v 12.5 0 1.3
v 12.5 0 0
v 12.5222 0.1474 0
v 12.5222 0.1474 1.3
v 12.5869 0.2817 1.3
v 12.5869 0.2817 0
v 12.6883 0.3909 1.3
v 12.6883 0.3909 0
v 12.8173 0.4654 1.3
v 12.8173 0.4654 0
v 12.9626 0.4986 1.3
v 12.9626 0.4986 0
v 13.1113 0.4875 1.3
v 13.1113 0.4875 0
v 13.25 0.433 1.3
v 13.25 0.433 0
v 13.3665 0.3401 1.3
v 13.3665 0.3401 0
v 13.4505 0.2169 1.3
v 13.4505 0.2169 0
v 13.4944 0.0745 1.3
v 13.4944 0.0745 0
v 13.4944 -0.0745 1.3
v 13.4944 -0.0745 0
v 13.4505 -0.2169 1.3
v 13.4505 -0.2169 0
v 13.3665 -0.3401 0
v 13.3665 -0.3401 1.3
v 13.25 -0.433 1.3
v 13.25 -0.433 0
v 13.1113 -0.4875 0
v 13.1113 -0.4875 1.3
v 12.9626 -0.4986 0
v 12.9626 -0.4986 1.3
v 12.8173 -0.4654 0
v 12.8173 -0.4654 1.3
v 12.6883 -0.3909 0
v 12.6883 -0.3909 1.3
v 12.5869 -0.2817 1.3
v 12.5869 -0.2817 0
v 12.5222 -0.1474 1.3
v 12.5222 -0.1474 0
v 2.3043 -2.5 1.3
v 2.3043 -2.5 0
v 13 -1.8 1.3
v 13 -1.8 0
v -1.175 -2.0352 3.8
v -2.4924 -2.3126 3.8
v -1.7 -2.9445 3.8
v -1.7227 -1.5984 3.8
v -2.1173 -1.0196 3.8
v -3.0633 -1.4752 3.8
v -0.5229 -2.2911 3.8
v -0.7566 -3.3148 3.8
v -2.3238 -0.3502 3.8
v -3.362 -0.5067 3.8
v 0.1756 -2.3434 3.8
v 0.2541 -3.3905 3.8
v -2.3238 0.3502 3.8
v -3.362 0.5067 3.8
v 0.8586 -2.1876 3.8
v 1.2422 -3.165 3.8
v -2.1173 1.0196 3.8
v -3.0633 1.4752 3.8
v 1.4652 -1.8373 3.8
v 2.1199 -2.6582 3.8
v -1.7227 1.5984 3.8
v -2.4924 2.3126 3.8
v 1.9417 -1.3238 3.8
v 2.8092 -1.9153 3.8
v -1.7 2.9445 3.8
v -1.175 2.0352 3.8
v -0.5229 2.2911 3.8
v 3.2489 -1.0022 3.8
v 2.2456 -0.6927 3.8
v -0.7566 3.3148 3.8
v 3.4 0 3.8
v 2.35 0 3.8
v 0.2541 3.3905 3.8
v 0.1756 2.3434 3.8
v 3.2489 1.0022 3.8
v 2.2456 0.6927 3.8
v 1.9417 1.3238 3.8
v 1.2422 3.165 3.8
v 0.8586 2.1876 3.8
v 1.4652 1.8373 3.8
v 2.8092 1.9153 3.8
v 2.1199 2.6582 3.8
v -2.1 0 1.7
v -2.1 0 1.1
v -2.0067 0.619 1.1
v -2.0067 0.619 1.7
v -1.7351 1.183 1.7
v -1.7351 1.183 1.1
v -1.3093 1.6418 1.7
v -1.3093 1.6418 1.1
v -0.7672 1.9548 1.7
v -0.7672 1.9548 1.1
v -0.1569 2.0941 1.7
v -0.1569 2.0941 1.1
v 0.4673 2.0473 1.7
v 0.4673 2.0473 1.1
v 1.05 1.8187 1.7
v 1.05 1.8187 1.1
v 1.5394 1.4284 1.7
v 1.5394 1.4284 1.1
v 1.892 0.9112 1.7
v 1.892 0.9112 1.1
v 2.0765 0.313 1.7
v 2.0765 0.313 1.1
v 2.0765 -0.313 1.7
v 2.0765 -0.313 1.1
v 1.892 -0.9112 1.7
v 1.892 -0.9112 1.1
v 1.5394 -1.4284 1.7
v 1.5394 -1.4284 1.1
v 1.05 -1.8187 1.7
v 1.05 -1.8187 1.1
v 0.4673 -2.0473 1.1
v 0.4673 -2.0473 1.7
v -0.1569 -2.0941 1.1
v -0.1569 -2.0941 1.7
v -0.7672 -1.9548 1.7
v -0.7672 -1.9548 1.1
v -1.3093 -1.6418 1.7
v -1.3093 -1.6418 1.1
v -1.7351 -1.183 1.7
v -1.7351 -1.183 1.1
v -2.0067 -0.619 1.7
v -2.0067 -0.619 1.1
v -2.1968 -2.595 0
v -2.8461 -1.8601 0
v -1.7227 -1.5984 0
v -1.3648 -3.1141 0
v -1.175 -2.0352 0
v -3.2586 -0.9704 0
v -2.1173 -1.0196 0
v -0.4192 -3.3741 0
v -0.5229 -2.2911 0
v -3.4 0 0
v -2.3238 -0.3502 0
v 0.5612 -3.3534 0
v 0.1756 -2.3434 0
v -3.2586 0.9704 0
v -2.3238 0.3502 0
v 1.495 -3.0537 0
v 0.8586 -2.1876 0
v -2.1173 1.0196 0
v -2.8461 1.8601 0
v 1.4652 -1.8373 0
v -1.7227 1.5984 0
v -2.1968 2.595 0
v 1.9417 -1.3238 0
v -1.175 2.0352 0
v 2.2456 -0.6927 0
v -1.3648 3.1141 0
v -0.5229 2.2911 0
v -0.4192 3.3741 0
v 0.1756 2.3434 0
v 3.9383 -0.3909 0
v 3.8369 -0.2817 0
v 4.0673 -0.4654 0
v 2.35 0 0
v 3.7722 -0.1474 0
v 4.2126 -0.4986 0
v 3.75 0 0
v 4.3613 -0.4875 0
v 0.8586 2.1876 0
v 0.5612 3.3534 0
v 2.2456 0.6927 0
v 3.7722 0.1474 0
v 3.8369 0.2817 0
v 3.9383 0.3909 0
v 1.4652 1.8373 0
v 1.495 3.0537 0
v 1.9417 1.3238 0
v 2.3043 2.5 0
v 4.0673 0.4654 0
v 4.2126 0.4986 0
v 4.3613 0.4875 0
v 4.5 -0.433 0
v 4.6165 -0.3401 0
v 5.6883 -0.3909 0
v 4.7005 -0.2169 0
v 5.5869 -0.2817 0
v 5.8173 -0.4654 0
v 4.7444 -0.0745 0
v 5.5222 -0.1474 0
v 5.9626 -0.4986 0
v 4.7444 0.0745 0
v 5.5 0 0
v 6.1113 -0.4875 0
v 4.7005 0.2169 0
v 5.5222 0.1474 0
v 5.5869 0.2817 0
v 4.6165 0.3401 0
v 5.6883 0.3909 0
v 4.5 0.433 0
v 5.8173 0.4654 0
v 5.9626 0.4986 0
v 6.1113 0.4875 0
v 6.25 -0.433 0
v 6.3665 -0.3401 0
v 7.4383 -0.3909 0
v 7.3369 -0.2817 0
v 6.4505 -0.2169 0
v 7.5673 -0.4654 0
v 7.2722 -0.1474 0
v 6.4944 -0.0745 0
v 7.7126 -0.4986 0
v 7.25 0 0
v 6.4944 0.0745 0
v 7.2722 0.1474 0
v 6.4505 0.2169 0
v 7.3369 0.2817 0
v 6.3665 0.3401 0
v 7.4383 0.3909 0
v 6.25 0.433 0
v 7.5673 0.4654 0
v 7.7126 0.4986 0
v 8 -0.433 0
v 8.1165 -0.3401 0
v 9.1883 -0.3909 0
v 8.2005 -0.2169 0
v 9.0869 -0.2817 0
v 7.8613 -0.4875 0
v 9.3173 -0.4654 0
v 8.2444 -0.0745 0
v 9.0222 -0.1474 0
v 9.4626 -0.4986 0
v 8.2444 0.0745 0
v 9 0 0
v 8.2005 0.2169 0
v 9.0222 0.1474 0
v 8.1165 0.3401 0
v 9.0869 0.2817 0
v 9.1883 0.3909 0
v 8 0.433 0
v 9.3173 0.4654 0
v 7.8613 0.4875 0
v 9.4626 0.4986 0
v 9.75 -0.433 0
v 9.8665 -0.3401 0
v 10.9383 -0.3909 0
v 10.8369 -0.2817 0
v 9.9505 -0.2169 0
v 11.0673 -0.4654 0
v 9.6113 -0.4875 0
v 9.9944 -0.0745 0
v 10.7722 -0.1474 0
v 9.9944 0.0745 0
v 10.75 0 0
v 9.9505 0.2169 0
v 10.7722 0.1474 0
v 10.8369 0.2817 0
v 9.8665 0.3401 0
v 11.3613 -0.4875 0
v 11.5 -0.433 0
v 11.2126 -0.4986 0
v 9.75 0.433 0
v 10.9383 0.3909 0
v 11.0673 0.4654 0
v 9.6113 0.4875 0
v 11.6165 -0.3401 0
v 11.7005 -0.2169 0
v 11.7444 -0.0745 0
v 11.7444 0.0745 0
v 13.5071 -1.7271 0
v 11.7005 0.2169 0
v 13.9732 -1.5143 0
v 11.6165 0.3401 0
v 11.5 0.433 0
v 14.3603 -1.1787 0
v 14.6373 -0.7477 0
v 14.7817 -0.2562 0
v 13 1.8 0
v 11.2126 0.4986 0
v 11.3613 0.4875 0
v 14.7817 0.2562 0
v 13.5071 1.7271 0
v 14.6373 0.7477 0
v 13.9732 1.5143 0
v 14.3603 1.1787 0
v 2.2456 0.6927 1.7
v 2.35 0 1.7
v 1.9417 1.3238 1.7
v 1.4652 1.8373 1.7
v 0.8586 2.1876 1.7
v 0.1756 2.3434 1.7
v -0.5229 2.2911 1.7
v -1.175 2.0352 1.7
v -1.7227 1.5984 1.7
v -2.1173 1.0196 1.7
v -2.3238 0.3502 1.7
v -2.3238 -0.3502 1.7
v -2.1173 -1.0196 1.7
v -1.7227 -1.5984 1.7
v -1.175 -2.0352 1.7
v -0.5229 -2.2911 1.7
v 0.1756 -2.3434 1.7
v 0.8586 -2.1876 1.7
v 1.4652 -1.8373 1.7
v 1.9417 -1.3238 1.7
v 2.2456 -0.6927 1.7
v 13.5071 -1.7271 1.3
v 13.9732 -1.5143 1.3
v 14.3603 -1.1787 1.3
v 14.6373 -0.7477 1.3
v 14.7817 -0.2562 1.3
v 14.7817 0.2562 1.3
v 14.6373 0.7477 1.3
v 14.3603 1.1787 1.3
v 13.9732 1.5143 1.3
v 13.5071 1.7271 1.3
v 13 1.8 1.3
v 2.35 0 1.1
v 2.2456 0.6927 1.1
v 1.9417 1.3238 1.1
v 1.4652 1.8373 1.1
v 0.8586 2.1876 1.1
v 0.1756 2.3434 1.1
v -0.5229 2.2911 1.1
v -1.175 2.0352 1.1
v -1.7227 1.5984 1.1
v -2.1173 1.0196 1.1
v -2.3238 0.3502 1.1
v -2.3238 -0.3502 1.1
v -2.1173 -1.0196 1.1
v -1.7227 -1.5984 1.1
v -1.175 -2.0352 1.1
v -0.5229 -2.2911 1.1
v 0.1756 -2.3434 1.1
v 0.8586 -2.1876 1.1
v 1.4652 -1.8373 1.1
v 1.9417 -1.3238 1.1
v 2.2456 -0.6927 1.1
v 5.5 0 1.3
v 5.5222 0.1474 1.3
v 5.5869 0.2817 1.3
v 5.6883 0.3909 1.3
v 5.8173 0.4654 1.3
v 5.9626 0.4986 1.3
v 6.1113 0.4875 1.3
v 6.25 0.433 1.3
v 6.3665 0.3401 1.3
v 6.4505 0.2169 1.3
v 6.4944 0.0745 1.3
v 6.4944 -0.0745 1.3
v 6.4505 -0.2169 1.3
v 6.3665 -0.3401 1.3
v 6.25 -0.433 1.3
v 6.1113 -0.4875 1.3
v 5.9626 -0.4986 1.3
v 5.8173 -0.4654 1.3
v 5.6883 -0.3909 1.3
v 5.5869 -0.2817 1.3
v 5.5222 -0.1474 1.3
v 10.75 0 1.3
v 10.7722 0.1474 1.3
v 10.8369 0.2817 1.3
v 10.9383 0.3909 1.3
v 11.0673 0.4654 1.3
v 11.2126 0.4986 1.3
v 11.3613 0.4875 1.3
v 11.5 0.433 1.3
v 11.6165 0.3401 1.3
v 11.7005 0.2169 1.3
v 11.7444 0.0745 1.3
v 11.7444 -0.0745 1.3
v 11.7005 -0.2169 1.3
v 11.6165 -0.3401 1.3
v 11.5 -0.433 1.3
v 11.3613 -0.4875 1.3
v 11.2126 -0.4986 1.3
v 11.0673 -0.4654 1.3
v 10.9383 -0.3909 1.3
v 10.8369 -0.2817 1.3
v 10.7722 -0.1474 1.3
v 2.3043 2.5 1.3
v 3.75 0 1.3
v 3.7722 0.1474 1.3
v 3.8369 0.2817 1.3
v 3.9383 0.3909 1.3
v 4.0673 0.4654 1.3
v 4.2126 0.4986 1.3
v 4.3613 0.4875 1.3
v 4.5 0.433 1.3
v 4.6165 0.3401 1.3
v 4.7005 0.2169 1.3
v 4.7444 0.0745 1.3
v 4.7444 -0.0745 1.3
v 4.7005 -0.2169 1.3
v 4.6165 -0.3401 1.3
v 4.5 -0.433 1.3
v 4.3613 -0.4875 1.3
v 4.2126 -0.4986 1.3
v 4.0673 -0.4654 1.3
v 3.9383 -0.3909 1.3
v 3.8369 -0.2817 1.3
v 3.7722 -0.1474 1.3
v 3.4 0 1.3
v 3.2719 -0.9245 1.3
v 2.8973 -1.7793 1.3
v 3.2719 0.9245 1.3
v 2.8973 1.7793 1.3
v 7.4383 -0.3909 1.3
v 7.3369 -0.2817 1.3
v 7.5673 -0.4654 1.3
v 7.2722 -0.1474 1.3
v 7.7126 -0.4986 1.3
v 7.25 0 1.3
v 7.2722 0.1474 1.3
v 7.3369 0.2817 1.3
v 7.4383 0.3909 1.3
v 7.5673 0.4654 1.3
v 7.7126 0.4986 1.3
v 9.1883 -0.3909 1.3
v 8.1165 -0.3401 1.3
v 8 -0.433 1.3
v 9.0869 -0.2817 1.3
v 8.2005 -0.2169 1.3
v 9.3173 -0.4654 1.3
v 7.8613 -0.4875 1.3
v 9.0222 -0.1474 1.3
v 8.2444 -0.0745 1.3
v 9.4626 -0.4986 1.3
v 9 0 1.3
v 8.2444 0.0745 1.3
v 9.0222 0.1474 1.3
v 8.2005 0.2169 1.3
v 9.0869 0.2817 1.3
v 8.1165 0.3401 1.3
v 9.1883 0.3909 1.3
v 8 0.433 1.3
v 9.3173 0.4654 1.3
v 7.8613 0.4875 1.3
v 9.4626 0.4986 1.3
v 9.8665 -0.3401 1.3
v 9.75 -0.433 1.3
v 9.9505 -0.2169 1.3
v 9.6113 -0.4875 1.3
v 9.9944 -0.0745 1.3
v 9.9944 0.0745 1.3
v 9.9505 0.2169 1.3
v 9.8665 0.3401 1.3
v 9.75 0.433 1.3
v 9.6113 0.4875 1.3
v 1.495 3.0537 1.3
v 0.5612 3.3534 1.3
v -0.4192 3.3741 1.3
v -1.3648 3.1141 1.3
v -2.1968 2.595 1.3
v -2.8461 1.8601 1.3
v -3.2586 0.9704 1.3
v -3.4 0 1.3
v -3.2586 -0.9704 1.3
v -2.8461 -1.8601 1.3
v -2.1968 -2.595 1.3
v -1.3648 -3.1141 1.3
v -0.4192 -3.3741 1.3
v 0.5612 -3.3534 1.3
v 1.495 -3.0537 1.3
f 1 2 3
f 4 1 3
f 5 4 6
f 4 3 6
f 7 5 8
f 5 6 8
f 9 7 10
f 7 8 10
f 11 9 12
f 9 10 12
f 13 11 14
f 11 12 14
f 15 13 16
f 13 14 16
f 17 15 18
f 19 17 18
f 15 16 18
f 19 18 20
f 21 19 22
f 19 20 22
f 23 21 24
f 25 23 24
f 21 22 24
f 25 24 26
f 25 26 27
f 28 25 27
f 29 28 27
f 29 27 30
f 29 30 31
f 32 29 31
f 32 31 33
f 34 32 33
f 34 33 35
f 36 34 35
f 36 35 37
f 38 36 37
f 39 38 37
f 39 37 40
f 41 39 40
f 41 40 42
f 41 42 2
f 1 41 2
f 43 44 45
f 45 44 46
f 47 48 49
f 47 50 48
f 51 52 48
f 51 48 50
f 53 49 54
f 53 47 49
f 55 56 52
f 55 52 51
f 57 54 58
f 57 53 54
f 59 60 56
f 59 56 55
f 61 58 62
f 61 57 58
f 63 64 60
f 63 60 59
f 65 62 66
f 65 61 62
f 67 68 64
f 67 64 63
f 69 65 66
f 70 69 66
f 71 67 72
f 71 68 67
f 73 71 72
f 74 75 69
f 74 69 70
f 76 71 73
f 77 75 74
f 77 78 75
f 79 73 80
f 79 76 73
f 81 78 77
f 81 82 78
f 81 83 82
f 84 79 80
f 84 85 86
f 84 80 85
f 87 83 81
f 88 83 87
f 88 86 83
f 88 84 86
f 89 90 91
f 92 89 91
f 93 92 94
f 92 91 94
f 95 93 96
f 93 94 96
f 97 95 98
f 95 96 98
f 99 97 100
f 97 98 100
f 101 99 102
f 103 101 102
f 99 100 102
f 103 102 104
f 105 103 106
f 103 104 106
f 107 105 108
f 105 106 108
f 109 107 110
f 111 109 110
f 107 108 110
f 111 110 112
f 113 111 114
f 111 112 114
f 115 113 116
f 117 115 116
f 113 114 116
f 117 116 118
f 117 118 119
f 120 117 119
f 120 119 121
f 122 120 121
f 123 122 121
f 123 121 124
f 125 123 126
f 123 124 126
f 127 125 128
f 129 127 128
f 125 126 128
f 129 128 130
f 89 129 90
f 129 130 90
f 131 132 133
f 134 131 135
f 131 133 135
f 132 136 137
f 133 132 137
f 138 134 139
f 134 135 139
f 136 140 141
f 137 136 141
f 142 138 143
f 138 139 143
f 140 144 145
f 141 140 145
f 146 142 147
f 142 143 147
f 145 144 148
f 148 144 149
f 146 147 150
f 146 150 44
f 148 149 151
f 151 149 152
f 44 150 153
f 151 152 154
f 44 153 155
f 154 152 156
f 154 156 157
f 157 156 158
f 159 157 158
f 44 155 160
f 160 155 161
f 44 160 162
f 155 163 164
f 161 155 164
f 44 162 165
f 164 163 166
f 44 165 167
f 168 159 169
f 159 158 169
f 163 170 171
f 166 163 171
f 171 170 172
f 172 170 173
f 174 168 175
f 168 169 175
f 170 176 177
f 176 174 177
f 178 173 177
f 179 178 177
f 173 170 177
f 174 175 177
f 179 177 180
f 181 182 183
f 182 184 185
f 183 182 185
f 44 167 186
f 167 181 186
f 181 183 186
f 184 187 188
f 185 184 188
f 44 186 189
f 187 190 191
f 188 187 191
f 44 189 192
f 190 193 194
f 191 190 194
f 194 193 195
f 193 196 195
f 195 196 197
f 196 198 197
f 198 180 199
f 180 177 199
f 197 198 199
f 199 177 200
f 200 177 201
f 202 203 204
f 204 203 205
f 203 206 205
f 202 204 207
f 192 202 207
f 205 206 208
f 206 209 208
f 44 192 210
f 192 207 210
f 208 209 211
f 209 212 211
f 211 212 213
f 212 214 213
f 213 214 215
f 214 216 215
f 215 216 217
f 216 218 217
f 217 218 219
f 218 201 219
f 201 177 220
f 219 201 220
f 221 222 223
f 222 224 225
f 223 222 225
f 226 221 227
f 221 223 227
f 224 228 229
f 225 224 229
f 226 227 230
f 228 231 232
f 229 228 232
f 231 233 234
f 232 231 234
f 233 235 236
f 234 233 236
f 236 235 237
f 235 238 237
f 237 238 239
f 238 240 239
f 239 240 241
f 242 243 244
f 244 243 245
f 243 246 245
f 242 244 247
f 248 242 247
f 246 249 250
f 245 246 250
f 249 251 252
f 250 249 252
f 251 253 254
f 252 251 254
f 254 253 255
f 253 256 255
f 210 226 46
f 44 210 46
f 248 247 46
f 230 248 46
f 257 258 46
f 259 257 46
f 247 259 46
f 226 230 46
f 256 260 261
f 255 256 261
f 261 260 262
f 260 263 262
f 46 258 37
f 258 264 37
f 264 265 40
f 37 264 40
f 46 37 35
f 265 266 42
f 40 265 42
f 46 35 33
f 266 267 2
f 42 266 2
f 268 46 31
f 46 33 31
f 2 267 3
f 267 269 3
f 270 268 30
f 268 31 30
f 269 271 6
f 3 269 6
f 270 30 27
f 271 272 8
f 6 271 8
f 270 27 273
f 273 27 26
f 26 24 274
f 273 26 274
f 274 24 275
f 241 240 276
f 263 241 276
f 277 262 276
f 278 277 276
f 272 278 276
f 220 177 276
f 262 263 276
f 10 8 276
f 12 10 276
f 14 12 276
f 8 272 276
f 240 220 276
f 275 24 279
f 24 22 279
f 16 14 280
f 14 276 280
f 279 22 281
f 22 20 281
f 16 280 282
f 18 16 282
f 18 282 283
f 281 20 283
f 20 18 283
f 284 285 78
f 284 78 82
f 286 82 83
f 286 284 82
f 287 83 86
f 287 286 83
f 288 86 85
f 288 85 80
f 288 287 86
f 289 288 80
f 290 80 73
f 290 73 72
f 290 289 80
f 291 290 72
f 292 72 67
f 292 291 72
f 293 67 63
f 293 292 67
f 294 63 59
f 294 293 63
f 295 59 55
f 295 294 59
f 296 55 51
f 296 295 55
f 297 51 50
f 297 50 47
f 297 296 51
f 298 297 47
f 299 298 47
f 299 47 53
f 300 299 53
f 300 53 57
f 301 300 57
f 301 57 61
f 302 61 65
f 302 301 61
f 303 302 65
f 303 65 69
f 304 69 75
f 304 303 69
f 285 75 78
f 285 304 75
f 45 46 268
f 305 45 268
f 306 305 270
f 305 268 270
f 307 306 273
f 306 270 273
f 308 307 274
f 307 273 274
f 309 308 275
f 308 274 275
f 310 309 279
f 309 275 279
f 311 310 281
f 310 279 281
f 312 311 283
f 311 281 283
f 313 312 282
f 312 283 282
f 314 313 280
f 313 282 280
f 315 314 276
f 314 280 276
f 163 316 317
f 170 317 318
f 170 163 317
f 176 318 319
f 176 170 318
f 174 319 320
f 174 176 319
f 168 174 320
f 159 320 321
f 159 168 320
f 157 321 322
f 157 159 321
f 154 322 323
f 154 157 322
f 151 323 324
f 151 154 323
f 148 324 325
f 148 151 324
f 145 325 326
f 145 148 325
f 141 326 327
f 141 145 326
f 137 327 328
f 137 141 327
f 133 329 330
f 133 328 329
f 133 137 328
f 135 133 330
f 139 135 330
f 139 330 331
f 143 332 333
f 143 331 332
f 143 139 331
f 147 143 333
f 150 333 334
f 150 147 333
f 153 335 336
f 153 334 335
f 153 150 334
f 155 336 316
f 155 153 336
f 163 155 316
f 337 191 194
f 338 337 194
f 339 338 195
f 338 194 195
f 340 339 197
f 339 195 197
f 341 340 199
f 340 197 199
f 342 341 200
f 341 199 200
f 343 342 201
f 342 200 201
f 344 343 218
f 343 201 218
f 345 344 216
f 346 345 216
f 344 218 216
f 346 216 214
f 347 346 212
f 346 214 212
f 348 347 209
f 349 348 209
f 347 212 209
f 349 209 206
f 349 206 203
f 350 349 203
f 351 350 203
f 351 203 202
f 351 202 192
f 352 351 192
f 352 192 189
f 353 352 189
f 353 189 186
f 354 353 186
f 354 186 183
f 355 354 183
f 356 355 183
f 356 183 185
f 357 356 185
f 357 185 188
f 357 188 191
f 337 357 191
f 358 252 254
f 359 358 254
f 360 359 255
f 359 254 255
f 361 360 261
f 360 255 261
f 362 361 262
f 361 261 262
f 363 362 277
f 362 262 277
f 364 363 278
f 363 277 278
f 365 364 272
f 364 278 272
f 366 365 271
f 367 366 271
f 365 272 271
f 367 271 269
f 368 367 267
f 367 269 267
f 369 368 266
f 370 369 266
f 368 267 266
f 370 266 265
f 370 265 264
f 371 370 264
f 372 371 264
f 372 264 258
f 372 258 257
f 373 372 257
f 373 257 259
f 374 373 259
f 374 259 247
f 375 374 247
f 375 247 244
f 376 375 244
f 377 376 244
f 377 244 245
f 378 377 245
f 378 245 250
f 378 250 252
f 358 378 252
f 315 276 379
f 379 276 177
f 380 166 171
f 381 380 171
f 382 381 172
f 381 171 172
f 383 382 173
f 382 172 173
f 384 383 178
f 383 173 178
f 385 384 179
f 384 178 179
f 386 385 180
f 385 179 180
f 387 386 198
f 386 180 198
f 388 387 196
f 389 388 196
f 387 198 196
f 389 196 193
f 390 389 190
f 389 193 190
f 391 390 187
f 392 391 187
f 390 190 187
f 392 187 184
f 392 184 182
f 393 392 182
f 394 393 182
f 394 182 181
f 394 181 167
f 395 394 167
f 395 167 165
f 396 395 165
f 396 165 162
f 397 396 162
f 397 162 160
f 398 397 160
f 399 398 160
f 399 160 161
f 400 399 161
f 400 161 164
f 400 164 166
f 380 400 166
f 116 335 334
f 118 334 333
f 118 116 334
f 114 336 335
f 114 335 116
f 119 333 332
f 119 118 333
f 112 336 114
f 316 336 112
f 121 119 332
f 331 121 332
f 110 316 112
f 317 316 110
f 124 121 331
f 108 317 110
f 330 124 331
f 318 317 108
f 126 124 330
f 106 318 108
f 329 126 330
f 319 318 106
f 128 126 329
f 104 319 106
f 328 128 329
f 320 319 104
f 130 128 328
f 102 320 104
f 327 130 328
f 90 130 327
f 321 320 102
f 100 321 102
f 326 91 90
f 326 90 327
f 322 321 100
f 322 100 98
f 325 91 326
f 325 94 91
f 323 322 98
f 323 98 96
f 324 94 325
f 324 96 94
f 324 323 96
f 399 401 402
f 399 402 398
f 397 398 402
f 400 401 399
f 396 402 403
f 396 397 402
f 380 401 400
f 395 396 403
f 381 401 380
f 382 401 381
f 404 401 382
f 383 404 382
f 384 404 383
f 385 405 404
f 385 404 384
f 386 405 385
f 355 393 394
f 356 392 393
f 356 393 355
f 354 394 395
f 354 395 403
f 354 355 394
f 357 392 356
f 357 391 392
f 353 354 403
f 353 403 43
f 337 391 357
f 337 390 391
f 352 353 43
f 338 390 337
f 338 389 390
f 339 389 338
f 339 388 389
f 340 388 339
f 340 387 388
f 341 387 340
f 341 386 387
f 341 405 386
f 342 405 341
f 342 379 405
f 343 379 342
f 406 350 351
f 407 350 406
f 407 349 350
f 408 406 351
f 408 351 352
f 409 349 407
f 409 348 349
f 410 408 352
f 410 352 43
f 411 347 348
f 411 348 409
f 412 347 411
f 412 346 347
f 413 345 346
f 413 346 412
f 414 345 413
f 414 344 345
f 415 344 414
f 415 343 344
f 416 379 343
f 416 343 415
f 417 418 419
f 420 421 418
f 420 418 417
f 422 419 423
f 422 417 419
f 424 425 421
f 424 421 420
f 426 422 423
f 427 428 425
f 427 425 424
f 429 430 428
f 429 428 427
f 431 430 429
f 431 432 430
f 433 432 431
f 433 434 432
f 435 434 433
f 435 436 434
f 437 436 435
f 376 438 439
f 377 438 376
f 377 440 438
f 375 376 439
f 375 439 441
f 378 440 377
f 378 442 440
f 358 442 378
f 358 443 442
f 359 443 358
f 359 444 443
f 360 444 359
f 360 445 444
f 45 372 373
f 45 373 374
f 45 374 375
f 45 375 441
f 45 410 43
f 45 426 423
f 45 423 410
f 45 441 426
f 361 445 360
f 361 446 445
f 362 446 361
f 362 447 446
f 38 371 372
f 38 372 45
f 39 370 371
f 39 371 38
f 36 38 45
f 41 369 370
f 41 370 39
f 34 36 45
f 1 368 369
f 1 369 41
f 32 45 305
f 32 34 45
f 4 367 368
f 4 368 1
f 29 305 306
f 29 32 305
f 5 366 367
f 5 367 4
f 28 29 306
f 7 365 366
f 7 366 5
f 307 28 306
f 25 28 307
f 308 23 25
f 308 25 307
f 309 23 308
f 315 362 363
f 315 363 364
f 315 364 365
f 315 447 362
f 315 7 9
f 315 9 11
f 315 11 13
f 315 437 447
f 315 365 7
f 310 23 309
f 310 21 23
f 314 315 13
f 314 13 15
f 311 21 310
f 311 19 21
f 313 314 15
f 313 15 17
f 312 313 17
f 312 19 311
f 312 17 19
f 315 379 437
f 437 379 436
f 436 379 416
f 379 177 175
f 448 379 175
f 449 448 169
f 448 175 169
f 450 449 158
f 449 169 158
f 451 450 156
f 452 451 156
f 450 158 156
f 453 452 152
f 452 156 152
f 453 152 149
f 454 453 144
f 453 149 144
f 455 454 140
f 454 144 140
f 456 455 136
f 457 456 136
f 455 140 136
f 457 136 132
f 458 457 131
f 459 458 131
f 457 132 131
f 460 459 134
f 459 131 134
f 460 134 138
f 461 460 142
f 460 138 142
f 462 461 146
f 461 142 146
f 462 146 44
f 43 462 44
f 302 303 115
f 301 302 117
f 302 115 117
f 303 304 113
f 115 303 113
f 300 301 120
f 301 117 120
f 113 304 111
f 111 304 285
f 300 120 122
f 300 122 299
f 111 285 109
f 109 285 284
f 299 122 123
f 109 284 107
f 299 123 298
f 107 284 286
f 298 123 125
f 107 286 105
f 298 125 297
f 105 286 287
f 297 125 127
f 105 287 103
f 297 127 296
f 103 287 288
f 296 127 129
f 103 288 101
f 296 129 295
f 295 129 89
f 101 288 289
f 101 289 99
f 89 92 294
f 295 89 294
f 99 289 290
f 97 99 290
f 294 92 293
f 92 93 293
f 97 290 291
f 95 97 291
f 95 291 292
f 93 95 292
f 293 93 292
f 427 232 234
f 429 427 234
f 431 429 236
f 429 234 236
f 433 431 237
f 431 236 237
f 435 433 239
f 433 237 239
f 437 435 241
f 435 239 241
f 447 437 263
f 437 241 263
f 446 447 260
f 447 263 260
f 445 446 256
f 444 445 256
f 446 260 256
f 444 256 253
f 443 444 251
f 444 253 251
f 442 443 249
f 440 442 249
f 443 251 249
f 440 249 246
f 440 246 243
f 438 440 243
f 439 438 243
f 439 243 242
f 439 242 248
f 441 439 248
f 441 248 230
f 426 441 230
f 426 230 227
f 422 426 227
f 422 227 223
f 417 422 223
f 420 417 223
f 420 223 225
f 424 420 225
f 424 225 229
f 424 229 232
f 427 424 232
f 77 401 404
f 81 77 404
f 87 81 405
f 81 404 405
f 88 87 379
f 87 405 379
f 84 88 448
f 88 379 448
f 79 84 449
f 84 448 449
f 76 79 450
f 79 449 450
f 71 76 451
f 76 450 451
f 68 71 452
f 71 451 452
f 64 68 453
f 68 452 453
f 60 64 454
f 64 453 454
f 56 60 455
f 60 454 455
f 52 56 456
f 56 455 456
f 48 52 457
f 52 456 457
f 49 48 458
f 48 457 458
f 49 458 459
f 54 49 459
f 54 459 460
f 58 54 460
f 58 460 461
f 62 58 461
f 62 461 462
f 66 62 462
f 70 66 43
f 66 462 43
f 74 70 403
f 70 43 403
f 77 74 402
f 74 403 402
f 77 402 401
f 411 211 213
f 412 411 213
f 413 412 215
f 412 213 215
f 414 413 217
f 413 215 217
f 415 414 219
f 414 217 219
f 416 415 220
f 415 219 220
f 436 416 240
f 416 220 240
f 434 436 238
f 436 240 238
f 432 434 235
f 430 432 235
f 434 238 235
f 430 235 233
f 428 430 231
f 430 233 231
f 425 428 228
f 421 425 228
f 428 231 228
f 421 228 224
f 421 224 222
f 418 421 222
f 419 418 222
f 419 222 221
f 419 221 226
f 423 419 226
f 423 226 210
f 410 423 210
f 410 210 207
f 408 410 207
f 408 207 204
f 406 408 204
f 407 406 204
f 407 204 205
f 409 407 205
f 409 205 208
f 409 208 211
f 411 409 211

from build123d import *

# Parameters (mm, degrees)
BOSS_EXTRUDE1_DEPTH = 1.3
SKETCH2_R           = 2.35
CUT_EXTRUDE1_DEPTH  = 1.3
SKETCH3_R           = 3.4
SKETCH3_R_2         = 2.35
BOSS_EXTRUDE2_DEPTH = 2.5
BOSS_EXTRUDE3_START = -1.1
SKETCH4_R           = 2.35
SKETCH4_R_2         = 2.1
BOSS_EXTRUDE3_DEPTH = 0.6
CUT_EXTRUDE3_REACH  = 5.8
SKETCH5_R           = 0.5


with BuildPart() as part:
    # Sketch1 → Boss-Extrude1 (new body)
    with BuildSketch(Plane.XY):
        with BuildLine():
            Line((13, 1.8), (2.304343724, 2.5))
            ThreePointArc((2.304343724, 2.5), (-3.4, 0), (2.304343724, -2.5))
            Line((2.304343724, -2.5), (13, -1.8))
            ThreePointArc((13, -1.8), (14.8, 0), (13, 1.8))
        make_face()
    extrude(amount=BOSS_EXTRUDE1_DEPTH)

    # Sketch2 → Cut-Extrude1 (cut)
    with BuildSketch(Plane.XY.offset(1.3)):
        Circle(SKETCH2_R)
    extrude(amount=-CUT_EXTRUDE1_DEPTH, mode=Mode.SUBTRACT)

    # Sketch3 → Boss-Extrude2 (add)
    with BuildSketch(Plane.XY.offset(1.3)):
        Circle(SKETCH3_R)
        Circle(SKETCH3_R_2, mode=Mode.SUBTRACT)
    extrude(amount=BOSS_EXTRUDE2_DEPTH)

    # Sketch4 → Boss-Extrude3 (add)
    with BuildSketch(Plane(origin=(0, 0, 0), x_dir=(-1, 0, 0), z_dir=(0, 0, -1)).offset(BOSS_EXTRUDE3_START)):
        Circle(SKETCH4_R)
        Circle(SKETCH4_R_2, mode=Mode.SUBTRACT)
    extrude(amount=-BOSS_EXTRUDE3_DEPTH)

    # Sketch5 → Cut-Extrude3 (cut, up to next)
    with BuildSketch(Plane(origin=(0, 0, 0), x_dir=(-1, 0, 0), z_dir=(0, 0, -1)), mode=Mode.PRIVATE) as cut_extrude3_sk1:
        with Locations((-13, 0)):
            Circle(SKETCH5_R)
    cut_extrude3_tool1 = extrude(cut_extrude3_sk1.sketch, amount=-CUT_EXTRUDE3_REACH, mode=Mode.PRIVATE) & part.part
    add(cut_extrude3_tool1.solids().sort_by_distance((13, 0, 0))[0], mode=Mode.SUBTRACT)
    # Sketch5 → Cut-Extrude3 (cut, up to next)
    with BuildSketch(Plane(origin=(0, 0, 0), x_dir=(-1, 0, 0), z_dir=(0, 0, -1)), mode=Mode.PRIVATE) as cut_extrude3_sk2:
        with Locations((-11.25, 0)):
            Circle(SKETCH5_R)
    cut_extrude3_tool2 = extrude(cut_extrude3_sk2.sketch, amount=-CUT_EXTRUDE3_REACH, mode=Mode.PRIVATE) & part.part
    add(cut_extrude3_tool2.solids().sort_by_distance((11.25, 0, 0))[0], mode=Mode.SUBTRACT)
    # Sketch5 → Cut-Extrude3 (cut, up to next)
    with BuildSketch(Plane(origin=(0, 0, 0), x_dir=(-1, 0, 0), z_dir=(0, 0, -1)), mode=Mode.PRIVATE) as cut_extrude3_sk3:
        with Locations((-9.5, 0)):
            Circle(SKETCH5_R)
    cut_extrude3_tool3 = extrude(cut_extrude3_sk3.sketch, amount=-CUT_EXTRUDE3_REACH, mode=Mode.PRIVATE) & part.part
    add(cut_extrude3_tool3.solids().sort_by_distance((9.5, 0, 0))[0], mode=Mode.SUBTRACT)
    # Sketch5 → Cut-Extrude3 (cut, up to next)
    with BuildSketch(Plane(origin=(0, 0, 0), x_dir=(-1, 0, 0), z_dir=(0, 0, -1)), mode=Mode.PRIVATE) as cut_extrude3_sk4:
        with Locations((-7.75, 0)):
            Circle(SKETCH5_R)
    cut_extrude3_tool4 = extrude(cut_extrude3_sk4.sketch, amount=-CUT_EXTRUDE3_REACH, mode=Mode.PRIVATE) & part.part
    add(cut_extrude3_tool4.solids().sort_by_distance((7.75, 0, 0))[0], mode=Mode.SUBTRACT)
    # Sketch5 → Cut-Extrude3 (cut, up to next)
    with BuildSketch(Plane(origin=(0, 0, 0), x_dir=(-1, 0, 0), z_dir=(0, 0, -1)), mode=Mode.PRIVATE) as cut_extrude3_sk5:
        with Locations((-6, 0)):
            Circle(SKETCH5_R)
    cut_extrude3_tool5 = extrude(cut_extrude3_sk5.sketch, amount=-CUT_EXTRUDE3_REACH, mode=Mode.PRIVATE) & part.part
    add(cut_extrude3_tool5.solids().sort_by_distance((6, 0, 0))[0], mode=Mode.SUBTRACT)
    # Sketch5 → Cut-Extrude3 (cut, up to next)
    with BuildSketch(Plane(origin=(0, 0, 0), x_dir=(-1, 0, 0), z_dir=(0, 0, -1)), mode=Mode.PRIVATE) as cut_extrude3_sk6:
        with Locations((-4.25, 0)):
            Circle(SKETCH5_R)
    cut_extrude3_tool6 = extrude(cut_extrude3_sk6.sketch, amount=-CUT_EXTRUDE3_REACH, mode=Mode.PRIVATE) & part.part
    add(cut_extrude3_tool6.solids().sort_by_distance((4.25, 0, 0))[0], mode=Mode.SUBTRACT)


solid = part.part
